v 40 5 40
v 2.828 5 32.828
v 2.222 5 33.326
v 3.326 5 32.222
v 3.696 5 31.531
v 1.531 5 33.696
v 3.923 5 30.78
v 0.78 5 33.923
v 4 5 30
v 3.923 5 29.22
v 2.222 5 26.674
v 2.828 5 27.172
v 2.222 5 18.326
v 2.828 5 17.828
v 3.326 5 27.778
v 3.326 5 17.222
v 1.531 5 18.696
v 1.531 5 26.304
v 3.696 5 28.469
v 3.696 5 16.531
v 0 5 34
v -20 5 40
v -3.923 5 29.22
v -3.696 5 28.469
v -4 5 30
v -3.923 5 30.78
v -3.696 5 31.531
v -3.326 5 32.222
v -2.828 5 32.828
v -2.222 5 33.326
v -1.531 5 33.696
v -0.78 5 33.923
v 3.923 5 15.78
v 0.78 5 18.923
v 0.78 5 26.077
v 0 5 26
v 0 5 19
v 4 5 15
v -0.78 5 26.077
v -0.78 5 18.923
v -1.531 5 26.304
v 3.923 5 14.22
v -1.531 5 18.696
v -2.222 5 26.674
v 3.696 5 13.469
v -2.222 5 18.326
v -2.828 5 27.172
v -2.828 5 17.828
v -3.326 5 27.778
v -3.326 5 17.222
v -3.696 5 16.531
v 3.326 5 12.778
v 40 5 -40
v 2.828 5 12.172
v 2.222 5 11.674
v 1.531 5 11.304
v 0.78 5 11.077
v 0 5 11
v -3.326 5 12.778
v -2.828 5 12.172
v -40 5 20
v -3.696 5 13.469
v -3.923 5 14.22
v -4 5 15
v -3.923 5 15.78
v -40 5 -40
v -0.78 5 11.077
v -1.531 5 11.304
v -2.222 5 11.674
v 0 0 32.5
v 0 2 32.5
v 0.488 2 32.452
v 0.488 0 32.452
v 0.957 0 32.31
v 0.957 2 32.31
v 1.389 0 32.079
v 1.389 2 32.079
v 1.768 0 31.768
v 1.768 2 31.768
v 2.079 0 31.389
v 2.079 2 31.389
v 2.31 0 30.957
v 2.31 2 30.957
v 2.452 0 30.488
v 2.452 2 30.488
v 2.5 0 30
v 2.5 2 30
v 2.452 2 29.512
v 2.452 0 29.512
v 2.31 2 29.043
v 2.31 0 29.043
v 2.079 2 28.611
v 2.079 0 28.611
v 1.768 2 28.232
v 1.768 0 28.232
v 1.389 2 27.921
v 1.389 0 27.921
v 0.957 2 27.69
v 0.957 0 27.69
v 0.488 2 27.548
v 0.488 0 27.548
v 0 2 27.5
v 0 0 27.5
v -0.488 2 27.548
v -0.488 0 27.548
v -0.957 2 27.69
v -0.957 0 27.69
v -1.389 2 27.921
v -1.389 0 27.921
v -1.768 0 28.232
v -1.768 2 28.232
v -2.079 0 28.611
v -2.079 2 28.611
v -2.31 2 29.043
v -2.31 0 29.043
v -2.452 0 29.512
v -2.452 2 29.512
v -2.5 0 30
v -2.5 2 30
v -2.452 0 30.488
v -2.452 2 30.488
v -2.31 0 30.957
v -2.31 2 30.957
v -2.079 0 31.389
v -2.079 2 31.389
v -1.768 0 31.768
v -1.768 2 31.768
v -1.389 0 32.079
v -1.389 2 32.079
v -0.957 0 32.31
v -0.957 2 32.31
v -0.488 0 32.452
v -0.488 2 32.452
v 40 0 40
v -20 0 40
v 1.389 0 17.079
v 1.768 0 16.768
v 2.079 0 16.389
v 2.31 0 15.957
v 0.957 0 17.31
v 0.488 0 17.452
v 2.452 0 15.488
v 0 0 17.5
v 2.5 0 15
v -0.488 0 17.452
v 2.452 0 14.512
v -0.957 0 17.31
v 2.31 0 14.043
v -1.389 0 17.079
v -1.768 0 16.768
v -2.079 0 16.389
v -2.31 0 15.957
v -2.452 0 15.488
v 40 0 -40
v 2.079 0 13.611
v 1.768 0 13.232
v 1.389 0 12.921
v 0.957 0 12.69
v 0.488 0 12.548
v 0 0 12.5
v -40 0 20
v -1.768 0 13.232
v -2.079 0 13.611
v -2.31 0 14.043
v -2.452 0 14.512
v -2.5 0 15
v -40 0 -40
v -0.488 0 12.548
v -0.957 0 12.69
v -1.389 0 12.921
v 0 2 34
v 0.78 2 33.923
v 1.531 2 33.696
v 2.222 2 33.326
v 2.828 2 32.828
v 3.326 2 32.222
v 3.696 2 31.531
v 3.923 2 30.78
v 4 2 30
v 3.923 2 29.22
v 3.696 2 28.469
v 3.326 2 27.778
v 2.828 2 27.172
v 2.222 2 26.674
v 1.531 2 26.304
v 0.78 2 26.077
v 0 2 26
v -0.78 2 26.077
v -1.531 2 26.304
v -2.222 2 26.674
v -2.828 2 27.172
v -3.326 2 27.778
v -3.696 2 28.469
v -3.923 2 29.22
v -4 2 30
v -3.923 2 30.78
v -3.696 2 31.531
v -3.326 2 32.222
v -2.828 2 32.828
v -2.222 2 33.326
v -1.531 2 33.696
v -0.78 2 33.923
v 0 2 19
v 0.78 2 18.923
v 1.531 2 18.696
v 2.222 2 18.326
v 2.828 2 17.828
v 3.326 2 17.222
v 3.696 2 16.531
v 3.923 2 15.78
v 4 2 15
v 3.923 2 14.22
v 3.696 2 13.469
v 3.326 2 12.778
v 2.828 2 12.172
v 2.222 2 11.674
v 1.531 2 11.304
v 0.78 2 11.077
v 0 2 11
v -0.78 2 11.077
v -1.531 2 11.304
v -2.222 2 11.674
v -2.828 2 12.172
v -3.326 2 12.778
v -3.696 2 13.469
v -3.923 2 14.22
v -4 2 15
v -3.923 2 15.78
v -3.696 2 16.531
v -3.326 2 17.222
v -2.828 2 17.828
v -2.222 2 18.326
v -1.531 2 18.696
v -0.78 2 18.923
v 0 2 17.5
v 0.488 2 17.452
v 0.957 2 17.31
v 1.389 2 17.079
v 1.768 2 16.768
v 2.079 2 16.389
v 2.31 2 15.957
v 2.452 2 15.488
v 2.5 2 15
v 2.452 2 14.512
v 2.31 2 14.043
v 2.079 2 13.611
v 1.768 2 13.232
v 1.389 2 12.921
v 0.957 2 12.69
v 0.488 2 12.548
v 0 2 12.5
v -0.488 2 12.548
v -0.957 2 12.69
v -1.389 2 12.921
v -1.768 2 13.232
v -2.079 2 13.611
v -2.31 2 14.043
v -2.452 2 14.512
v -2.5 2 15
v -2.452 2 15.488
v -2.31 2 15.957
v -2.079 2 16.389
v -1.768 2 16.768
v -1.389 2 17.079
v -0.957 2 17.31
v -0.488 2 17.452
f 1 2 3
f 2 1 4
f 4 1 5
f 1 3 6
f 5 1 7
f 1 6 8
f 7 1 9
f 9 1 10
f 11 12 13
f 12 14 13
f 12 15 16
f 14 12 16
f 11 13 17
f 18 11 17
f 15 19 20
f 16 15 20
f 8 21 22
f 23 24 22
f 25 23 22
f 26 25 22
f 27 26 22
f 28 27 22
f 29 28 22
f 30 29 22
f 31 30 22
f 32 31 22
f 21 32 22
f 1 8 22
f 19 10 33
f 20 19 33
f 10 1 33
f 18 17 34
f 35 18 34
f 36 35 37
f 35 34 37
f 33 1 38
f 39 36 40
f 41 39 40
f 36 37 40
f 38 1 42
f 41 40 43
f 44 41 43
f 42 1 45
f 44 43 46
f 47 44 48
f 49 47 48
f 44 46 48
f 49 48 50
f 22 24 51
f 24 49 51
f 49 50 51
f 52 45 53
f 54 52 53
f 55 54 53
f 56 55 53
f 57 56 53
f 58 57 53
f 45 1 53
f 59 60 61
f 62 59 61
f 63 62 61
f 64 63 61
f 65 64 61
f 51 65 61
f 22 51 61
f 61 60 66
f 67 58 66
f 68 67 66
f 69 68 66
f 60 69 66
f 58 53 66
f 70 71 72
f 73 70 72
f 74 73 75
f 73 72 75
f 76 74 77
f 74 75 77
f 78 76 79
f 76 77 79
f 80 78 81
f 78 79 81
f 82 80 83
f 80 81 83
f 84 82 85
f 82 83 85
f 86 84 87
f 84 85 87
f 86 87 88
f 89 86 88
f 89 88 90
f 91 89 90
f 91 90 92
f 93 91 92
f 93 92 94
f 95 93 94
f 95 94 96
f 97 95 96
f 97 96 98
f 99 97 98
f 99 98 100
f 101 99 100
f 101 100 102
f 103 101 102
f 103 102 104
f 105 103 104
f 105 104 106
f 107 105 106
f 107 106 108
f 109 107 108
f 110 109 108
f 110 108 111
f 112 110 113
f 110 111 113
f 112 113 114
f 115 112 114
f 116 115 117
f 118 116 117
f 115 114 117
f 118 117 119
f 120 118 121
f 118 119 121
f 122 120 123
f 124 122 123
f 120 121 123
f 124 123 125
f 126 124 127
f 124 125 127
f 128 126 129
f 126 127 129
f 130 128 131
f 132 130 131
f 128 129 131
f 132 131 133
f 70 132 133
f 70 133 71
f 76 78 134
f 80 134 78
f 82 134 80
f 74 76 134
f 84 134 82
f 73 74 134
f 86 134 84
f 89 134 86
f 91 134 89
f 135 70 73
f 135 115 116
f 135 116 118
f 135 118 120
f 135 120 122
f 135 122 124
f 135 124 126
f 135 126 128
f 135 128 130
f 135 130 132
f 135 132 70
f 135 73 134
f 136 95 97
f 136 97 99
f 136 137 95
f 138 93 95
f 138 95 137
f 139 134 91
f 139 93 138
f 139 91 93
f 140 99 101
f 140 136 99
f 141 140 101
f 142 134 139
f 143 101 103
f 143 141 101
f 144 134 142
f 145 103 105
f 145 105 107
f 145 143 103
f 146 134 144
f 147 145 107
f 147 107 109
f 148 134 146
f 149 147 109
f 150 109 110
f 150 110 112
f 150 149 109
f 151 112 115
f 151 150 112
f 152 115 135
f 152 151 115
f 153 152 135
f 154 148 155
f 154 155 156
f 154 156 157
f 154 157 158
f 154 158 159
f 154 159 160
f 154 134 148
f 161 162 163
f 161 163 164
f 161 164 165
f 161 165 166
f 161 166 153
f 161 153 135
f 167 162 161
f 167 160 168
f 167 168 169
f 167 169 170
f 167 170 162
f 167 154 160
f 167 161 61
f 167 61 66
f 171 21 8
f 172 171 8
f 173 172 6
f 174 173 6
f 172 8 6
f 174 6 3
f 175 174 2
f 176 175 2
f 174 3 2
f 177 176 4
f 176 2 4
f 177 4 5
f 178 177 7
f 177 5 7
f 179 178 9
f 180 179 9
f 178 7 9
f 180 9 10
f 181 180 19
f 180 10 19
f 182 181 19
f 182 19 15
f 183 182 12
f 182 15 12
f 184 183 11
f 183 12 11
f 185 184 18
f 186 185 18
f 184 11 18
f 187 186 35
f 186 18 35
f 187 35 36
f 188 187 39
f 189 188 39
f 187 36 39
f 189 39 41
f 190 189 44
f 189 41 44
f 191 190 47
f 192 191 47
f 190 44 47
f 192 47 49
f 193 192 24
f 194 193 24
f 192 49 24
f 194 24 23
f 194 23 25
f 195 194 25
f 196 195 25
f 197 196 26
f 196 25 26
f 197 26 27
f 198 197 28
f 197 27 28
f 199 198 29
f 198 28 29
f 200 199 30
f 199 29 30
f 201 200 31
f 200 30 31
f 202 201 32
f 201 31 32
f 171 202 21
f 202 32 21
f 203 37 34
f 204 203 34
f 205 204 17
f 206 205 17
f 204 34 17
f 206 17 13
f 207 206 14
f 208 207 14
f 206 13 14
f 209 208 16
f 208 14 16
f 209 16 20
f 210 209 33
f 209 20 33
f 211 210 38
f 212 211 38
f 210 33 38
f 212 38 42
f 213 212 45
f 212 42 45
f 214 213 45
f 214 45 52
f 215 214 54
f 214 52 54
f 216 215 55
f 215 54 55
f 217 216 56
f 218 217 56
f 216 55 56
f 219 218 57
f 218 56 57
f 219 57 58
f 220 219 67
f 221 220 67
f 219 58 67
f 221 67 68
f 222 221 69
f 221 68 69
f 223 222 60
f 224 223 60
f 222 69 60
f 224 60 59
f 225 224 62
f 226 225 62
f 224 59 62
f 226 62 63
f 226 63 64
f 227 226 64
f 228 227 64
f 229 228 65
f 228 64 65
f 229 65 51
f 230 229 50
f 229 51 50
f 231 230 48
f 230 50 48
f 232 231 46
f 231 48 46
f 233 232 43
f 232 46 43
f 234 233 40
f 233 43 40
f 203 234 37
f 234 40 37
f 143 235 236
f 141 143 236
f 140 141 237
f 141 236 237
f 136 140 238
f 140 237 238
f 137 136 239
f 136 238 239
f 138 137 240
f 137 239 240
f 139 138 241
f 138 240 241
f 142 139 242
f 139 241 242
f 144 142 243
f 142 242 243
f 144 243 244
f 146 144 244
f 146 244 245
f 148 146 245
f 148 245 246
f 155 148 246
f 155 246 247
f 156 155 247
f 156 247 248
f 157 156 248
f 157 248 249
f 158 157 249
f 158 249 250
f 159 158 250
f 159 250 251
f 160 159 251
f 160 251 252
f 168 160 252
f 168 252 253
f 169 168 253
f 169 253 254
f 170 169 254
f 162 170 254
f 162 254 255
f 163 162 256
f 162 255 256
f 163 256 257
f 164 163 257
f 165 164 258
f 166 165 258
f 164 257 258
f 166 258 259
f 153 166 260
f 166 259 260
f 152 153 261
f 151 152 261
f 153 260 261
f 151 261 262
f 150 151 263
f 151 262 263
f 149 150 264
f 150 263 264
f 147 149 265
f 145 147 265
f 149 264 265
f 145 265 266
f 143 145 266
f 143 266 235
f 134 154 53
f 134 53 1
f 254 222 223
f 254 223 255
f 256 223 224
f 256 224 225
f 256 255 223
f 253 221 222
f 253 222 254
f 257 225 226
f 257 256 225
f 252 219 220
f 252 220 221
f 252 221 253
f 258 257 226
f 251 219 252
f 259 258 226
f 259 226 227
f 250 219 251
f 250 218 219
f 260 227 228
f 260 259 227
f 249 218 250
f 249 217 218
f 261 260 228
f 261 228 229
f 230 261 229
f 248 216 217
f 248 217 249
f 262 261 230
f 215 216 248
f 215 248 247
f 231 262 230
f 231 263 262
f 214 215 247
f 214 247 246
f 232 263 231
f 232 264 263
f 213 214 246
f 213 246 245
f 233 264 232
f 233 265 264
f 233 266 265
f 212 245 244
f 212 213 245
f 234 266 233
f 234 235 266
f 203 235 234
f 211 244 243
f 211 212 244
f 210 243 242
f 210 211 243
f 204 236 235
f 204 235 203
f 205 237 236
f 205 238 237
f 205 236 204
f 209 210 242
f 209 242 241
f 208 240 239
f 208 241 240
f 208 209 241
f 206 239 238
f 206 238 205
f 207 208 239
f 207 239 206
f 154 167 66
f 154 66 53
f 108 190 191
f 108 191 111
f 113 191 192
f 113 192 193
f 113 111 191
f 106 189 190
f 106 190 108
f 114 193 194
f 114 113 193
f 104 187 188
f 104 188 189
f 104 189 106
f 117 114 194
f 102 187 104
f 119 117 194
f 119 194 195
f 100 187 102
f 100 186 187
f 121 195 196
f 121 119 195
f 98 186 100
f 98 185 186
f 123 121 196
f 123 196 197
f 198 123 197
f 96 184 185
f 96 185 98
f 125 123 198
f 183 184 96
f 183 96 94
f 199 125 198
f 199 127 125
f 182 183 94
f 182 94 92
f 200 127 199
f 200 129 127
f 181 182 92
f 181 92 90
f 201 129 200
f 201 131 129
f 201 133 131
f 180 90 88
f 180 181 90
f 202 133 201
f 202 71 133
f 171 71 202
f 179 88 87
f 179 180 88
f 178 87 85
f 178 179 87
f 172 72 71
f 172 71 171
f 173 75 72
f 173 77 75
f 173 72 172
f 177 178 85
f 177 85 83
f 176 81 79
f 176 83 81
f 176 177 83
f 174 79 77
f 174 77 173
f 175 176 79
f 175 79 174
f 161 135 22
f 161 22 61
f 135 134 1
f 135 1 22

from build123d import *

# Parameters (mm, degrees)
BOSS_EXTRUDE1_DEPTH = 5
SKETCH2_R           = 2.5
CUT_EXTRUDE1_DEPTH  = 15
SKETCH3_R           = 4
CUT_EXTRUDE2_DEPTH  = 3


with BuildPart() as part:
    # Sketch1 → Boss-Extrude1 (new body)
    with BuildSketch(Plane(origin=(0, 0, 0), x_dir=(1, 0, 0), z_dir=(0, 1, 0))):
        Polygon((40, -40), (-20, -40), (-40, -20), (-40, 40), (40, 40), align=None)
    extrude(amount=BOSS_EXTRUDE1_DEPTH)

    # Sketch2 → Cut-Extrude1 (cut)
    with BuildSketch(Plane(origin=(0, 5, 0), x_dir=(1, 0, 0), z_dir=(0, 1, 0))):
        with Locations(Location((0, -15, 0), (0, 0, 270))):
            Circle(SKETCH2_R)
        with Locations(Location((0, -30, 0), (0, 0, 270))):
            Circle(SKETCH2_R)
    extrude(amount=-CUT_EXTRUDE1_DEPTH, mode=Mode.SUBTRACT)

    # Sketch3 → Cut-Extrude2 (cut)
    with BuildSketch(Plane(origin=(0, 5, 0), x_dir=(1, 0, 0), z_dir=(0, 1, 0))):
        with Locations(Location((0, -15, 0), (0, 0, 270))):
            Circle(SKETCH3_R)
        with Locations(Location((0, -30, 0), (0, 0, 270))):
            Circle(SKETCH3_R)
    extrude(amount=-CUT_EXTRUDE2_DEPTH, mode=Mode.SUBTRACT)


solid = part.part
